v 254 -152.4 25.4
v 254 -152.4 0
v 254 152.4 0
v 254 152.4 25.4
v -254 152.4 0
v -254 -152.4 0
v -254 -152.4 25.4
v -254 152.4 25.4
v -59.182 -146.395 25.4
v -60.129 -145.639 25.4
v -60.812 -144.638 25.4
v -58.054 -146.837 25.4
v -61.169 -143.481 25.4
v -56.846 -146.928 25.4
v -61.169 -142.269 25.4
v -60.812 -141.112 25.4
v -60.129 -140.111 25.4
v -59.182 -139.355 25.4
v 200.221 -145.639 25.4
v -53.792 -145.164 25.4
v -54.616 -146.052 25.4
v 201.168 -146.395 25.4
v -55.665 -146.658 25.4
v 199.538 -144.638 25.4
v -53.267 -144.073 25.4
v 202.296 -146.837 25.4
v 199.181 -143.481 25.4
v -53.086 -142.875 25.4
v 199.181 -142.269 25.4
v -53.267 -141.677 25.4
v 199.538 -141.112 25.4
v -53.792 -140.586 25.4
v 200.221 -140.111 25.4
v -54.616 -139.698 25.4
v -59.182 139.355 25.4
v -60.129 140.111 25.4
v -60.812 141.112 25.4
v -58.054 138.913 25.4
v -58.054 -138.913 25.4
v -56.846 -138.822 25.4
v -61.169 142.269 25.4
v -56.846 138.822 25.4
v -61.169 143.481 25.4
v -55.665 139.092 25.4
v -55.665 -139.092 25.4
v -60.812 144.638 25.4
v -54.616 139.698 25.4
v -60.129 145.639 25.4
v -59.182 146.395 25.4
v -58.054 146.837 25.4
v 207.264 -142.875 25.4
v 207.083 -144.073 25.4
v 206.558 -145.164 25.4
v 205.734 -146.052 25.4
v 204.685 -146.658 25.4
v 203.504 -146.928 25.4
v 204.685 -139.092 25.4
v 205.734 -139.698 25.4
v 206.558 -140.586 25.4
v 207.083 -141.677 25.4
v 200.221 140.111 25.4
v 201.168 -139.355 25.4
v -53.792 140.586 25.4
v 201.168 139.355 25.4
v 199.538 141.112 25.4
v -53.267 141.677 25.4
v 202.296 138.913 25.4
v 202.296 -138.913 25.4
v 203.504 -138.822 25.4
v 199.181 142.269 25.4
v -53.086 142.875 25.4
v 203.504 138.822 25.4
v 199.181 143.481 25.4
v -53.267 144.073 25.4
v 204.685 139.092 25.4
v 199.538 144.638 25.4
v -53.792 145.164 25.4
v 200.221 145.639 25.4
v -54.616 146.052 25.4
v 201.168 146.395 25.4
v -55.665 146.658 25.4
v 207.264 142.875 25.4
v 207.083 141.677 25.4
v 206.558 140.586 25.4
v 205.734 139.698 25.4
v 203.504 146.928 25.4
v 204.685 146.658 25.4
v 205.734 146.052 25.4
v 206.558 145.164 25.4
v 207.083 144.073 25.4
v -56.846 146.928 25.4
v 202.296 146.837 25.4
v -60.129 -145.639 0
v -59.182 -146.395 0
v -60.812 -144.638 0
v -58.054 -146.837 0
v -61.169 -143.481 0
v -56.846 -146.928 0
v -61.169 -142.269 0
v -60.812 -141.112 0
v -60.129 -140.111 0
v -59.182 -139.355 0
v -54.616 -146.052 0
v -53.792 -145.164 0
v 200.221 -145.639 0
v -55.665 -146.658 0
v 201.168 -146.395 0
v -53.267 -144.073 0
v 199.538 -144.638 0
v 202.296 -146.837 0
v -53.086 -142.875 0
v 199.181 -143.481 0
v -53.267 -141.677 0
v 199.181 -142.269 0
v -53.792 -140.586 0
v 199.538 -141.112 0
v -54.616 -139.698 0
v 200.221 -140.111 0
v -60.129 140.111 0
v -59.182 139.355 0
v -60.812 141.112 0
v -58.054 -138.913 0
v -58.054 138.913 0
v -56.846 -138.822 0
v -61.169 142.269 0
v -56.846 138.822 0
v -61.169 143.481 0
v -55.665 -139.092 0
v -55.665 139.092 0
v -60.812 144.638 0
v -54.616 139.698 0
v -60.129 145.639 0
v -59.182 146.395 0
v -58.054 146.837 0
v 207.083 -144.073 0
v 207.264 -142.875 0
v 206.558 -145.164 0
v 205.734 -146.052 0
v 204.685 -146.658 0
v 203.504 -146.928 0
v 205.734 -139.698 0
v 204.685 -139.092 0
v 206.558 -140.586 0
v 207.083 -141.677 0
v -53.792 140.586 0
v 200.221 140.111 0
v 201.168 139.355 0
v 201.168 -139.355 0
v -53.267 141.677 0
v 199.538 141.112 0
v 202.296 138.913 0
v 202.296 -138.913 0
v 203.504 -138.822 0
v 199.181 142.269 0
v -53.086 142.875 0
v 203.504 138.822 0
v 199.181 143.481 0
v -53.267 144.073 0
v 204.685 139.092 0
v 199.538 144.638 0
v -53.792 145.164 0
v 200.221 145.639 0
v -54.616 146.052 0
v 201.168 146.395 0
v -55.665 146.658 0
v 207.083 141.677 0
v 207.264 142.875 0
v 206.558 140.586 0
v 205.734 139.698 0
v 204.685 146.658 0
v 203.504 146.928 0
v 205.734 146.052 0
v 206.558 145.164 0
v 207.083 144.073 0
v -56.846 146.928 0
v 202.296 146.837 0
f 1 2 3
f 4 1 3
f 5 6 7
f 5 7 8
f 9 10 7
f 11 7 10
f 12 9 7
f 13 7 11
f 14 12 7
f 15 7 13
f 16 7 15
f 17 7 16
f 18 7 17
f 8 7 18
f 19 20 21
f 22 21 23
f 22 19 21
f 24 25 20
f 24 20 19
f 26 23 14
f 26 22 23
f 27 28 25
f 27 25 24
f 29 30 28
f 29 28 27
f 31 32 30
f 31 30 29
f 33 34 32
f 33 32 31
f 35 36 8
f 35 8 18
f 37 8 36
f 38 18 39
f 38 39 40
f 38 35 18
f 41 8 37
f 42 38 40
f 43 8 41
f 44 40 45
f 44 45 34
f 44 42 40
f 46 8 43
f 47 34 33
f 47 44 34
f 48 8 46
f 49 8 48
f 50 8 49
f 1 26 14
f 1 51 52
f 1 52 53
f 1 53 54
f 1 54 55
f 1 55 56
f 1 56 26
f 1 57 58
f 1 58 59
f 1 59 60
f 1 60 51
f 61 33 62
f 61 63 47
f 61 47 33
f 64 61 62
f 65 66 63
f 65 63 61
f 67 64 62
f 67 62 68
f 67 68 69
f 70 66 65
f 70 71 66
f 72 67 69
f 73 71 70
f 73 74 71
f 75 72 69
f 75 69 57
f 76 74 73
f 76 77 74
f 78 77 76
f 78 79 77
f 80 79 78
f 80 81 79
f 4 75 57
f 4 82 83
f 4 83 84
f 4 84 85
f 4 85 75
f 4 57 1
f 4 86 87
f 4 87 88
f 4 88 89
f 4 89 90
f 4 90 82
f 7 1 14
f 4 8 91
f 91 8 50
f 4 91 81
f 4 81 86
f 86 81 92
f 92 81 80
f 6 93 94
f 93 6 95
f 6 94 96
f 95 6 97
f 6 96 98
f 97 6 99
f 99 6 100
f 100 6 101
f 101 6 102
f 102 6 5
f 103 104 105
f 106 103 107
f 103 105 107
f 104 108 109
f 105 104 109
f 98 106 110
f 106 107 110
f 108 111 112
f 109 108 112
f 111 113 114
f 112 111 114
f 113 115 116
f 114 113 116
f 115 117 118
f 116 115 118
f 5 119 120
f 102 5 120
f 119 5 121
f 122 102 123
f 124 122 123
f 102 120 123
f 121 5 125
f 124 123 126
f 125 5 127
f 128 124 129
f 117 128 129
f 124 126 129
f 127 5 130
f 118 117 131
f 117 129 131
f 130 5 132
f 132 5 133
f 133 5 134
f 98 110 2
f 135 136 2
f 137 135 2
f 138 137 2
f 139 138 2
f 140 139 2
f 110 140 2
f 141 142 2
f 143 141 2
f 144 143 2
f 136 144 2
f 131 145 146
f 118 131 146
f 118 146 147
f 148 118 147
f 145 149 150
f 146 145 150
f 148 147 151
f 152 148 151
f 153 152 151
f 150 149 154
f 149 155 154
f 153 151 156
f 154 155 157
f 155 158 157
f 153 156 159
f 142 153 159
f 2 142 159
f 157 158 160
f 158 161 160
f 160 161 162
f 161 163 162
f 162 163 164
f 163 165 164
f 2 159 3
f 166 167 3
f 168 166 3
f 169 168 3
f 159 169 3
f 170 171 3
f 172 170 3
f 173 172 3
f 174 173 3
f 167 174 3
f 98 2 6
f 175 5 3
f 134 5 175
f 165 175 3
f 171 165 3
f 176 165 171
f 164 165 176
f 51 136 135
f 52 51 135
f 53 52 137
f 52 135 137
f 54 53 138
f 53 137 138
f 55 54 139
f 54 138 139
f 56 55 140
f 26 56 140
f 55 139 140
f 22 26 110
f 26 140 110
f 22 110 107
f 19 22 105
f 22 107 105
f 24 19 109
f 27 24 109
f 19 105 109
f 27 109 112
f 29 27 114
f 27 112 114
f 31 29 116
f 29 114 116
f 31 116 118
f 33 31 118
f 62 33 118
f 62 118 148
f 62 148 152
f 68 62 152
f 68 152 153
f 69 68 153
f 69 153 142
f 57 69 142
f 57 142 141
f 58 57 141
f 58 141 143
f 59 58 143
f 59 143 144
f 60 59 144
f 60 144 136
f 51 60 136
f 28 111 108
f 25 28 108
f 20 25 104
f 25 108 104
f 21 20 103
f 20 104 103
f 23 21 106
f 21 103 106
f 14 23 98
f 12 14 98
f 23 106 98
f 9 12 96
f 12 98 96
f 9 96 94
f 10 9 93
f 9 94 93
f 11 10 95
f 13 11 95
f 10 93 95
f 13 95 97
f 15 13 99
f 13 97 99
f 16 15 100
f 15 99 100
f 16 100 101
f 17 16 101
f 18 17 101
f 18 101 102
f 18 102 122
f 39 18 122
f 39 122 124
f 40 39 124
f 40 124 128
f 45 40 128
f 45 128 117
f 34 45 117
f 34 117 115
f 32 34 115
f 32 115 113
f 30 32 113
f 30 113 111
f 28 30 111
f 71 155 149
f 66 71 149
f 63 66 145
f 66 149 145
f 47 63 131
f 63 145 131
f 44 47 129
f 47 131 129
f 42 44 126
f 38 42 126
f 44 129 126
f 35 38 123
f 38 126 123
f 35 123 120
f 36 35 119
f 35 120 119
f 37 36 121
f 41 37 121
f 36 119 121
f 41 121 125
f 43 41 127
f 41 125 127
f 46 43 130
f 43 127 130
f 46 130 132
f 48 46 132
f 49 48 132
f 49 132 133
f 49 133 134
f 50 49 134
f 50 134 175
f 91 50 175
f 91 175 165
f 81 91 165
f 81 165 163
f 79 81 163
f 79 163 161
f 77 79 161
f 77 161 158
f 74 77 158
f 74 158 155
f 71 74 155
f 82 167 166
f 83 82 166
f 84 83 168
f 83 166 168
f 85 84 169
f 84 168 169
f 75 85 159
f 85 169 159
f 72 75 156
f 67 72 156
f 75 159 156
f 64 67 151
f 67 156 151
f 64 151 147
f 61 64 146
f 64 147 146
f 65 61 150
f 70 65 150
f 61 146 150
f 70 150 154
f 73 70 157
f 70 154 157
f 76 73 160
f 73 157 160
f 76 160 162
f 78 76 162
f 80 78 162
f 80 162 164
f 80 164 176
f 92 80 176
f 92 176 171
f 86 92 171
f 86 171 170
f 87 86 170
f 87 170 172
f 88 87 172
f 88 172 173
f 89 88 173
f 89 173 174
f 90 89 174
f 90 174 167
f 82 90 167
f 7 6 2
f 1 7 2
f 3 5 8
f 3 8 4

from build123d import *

# Parameters (mm, degrees)
F0_W     = 508
F0_H     = 304.8
F1_DEPTH = 25.4
F2_R     = 4.064
F3_DEPTH = 25.401


with BuildPart() as f1:
    # F0 (on Top) → F1 (new body)
    with BuildSketch(Plane.XY):
        Rectangle(F0_W, F0_H)
    extrude(amount=F1_DEPTH)

    # F2 (on face) → F3 (cut, through all)
    with BuildSketch(Plane(origin=(0, 0, 0), x_dir=(1, 0, 0), z_dir=(0, 0, -1))):
        with Locations((-57.15, 142.875)):
            Circle(F2_R)
        with Locations((203.2, 142.875)):
            Circle(F2_R)
        with Locations((203.2, -142.875)):
            Circle(F2_R)
        with Locations((-57.15, -142.875)):
            Circle(F2_R)
    extrude(amount=-F3_DEPTH, mode=Mode.SUBTRACT)


solid = f1.part
